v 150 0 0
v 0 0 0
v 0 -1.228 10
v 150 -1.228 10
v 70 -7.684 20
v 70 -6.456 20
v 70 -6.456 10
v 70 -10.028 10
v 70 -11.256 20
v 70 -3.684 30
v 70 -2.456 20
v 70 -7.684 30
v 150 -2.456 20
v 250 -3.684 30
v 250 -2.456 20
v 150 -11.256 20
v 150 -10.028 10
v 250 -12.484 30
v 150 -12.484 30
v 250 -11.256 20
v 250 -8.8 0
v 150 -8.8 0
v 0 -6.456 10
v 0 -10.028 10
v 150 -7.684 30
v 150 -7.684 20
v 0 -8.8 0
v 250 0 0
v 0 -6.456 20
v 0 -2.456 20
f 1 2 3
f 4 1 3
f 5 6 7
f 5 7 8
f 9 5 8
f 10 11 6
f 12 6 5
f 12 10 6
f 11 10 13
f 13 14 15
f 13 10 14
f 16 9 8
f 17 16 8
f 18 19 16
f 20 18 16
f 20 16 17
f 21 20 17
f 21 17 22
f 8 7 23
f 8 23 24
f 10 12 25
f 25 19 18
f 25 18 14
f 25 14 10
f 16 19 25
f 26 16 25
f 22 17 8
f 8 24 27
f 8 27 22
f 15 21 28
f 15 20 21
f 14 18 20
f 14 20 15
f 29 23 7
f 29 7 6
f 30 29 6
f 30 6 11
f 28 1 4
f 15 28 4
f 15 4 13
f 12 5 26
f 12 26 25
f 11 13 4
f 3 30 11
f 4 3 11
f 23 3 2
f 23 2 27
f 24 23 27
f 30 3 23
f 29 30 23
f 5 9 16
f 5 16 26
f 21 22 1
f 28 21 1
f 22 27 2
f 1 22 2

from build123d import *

# Parameters (mm, degrees)
F1_DEPTH  = 70
F3_DEPTH  = 80
F5_DEPTH  = 100
F8_DEPTH  = 70
F10_DEPTH = 80


with BuildPart() as f1:
    # F0 (on Right) → F1 (new body)
    with BuildSketch(Plane.YZ):
        Polygon((-8.8, 0), (0, 0), (-1.227845609, 10), (-10.027845609, 10), align=None)
    extrude(amount=F1_DEPTH)

    # F2 (on face) → F3 (join)
    with BuildSketch(Plane.YZ.offset(70)):
        Polygon((0, 0), (-1.227845609, 10), (-10.027845609, 10), (-8.8, 0), align=None)
        Polygon((-10.027845609, 10), (-1.227845609, 10), (-2.4556912181, 20), (-11.2556912181, 20), align=None)
    extrude(amount=F3_DEPTH)

    # F4 (on face) → F5 (join)
    with BuildSketch(Plane.YZ.offset(150)):
        Polygon((-8.8, 0), (0, 0), (-2.4556912181, 20), (-11.2556912181, 20), align=None)
        Polygon((-11.2556912181, 20), (-2.4556912181, 20), (-3.6835368271, 30), (-12.4835368271, 30), align=None)
    extrude(amount=F5_DEPTH)

    # F7 (on face) → F8 (join)
    with BuildSketch(Plane(origin=(0, 0, 0), x_dir=(0, -1, 0), z_dir=(-1, 0, 0))):
        Polygon((2.4556912181, 20), (1.227845609, 10), (6.4556912181, 10), (6.4556912181, 20), align=None)
    extrude(amount=-F8_DEPTH)

    # F9 (on face) → F10 (join)
    with BuildSketch(Plane(origin=(150, 0, 0), x_dir=(0, -1, 0), z_dir=(-1, 0, 0))):
        Polygon((2.4556912181, 20), (7.6835368271, 20), (7.6835368271, 30), (3.6835368271, 30), align=None)
    extrude(amount=F10_DEPTH)


solid = f1.part
